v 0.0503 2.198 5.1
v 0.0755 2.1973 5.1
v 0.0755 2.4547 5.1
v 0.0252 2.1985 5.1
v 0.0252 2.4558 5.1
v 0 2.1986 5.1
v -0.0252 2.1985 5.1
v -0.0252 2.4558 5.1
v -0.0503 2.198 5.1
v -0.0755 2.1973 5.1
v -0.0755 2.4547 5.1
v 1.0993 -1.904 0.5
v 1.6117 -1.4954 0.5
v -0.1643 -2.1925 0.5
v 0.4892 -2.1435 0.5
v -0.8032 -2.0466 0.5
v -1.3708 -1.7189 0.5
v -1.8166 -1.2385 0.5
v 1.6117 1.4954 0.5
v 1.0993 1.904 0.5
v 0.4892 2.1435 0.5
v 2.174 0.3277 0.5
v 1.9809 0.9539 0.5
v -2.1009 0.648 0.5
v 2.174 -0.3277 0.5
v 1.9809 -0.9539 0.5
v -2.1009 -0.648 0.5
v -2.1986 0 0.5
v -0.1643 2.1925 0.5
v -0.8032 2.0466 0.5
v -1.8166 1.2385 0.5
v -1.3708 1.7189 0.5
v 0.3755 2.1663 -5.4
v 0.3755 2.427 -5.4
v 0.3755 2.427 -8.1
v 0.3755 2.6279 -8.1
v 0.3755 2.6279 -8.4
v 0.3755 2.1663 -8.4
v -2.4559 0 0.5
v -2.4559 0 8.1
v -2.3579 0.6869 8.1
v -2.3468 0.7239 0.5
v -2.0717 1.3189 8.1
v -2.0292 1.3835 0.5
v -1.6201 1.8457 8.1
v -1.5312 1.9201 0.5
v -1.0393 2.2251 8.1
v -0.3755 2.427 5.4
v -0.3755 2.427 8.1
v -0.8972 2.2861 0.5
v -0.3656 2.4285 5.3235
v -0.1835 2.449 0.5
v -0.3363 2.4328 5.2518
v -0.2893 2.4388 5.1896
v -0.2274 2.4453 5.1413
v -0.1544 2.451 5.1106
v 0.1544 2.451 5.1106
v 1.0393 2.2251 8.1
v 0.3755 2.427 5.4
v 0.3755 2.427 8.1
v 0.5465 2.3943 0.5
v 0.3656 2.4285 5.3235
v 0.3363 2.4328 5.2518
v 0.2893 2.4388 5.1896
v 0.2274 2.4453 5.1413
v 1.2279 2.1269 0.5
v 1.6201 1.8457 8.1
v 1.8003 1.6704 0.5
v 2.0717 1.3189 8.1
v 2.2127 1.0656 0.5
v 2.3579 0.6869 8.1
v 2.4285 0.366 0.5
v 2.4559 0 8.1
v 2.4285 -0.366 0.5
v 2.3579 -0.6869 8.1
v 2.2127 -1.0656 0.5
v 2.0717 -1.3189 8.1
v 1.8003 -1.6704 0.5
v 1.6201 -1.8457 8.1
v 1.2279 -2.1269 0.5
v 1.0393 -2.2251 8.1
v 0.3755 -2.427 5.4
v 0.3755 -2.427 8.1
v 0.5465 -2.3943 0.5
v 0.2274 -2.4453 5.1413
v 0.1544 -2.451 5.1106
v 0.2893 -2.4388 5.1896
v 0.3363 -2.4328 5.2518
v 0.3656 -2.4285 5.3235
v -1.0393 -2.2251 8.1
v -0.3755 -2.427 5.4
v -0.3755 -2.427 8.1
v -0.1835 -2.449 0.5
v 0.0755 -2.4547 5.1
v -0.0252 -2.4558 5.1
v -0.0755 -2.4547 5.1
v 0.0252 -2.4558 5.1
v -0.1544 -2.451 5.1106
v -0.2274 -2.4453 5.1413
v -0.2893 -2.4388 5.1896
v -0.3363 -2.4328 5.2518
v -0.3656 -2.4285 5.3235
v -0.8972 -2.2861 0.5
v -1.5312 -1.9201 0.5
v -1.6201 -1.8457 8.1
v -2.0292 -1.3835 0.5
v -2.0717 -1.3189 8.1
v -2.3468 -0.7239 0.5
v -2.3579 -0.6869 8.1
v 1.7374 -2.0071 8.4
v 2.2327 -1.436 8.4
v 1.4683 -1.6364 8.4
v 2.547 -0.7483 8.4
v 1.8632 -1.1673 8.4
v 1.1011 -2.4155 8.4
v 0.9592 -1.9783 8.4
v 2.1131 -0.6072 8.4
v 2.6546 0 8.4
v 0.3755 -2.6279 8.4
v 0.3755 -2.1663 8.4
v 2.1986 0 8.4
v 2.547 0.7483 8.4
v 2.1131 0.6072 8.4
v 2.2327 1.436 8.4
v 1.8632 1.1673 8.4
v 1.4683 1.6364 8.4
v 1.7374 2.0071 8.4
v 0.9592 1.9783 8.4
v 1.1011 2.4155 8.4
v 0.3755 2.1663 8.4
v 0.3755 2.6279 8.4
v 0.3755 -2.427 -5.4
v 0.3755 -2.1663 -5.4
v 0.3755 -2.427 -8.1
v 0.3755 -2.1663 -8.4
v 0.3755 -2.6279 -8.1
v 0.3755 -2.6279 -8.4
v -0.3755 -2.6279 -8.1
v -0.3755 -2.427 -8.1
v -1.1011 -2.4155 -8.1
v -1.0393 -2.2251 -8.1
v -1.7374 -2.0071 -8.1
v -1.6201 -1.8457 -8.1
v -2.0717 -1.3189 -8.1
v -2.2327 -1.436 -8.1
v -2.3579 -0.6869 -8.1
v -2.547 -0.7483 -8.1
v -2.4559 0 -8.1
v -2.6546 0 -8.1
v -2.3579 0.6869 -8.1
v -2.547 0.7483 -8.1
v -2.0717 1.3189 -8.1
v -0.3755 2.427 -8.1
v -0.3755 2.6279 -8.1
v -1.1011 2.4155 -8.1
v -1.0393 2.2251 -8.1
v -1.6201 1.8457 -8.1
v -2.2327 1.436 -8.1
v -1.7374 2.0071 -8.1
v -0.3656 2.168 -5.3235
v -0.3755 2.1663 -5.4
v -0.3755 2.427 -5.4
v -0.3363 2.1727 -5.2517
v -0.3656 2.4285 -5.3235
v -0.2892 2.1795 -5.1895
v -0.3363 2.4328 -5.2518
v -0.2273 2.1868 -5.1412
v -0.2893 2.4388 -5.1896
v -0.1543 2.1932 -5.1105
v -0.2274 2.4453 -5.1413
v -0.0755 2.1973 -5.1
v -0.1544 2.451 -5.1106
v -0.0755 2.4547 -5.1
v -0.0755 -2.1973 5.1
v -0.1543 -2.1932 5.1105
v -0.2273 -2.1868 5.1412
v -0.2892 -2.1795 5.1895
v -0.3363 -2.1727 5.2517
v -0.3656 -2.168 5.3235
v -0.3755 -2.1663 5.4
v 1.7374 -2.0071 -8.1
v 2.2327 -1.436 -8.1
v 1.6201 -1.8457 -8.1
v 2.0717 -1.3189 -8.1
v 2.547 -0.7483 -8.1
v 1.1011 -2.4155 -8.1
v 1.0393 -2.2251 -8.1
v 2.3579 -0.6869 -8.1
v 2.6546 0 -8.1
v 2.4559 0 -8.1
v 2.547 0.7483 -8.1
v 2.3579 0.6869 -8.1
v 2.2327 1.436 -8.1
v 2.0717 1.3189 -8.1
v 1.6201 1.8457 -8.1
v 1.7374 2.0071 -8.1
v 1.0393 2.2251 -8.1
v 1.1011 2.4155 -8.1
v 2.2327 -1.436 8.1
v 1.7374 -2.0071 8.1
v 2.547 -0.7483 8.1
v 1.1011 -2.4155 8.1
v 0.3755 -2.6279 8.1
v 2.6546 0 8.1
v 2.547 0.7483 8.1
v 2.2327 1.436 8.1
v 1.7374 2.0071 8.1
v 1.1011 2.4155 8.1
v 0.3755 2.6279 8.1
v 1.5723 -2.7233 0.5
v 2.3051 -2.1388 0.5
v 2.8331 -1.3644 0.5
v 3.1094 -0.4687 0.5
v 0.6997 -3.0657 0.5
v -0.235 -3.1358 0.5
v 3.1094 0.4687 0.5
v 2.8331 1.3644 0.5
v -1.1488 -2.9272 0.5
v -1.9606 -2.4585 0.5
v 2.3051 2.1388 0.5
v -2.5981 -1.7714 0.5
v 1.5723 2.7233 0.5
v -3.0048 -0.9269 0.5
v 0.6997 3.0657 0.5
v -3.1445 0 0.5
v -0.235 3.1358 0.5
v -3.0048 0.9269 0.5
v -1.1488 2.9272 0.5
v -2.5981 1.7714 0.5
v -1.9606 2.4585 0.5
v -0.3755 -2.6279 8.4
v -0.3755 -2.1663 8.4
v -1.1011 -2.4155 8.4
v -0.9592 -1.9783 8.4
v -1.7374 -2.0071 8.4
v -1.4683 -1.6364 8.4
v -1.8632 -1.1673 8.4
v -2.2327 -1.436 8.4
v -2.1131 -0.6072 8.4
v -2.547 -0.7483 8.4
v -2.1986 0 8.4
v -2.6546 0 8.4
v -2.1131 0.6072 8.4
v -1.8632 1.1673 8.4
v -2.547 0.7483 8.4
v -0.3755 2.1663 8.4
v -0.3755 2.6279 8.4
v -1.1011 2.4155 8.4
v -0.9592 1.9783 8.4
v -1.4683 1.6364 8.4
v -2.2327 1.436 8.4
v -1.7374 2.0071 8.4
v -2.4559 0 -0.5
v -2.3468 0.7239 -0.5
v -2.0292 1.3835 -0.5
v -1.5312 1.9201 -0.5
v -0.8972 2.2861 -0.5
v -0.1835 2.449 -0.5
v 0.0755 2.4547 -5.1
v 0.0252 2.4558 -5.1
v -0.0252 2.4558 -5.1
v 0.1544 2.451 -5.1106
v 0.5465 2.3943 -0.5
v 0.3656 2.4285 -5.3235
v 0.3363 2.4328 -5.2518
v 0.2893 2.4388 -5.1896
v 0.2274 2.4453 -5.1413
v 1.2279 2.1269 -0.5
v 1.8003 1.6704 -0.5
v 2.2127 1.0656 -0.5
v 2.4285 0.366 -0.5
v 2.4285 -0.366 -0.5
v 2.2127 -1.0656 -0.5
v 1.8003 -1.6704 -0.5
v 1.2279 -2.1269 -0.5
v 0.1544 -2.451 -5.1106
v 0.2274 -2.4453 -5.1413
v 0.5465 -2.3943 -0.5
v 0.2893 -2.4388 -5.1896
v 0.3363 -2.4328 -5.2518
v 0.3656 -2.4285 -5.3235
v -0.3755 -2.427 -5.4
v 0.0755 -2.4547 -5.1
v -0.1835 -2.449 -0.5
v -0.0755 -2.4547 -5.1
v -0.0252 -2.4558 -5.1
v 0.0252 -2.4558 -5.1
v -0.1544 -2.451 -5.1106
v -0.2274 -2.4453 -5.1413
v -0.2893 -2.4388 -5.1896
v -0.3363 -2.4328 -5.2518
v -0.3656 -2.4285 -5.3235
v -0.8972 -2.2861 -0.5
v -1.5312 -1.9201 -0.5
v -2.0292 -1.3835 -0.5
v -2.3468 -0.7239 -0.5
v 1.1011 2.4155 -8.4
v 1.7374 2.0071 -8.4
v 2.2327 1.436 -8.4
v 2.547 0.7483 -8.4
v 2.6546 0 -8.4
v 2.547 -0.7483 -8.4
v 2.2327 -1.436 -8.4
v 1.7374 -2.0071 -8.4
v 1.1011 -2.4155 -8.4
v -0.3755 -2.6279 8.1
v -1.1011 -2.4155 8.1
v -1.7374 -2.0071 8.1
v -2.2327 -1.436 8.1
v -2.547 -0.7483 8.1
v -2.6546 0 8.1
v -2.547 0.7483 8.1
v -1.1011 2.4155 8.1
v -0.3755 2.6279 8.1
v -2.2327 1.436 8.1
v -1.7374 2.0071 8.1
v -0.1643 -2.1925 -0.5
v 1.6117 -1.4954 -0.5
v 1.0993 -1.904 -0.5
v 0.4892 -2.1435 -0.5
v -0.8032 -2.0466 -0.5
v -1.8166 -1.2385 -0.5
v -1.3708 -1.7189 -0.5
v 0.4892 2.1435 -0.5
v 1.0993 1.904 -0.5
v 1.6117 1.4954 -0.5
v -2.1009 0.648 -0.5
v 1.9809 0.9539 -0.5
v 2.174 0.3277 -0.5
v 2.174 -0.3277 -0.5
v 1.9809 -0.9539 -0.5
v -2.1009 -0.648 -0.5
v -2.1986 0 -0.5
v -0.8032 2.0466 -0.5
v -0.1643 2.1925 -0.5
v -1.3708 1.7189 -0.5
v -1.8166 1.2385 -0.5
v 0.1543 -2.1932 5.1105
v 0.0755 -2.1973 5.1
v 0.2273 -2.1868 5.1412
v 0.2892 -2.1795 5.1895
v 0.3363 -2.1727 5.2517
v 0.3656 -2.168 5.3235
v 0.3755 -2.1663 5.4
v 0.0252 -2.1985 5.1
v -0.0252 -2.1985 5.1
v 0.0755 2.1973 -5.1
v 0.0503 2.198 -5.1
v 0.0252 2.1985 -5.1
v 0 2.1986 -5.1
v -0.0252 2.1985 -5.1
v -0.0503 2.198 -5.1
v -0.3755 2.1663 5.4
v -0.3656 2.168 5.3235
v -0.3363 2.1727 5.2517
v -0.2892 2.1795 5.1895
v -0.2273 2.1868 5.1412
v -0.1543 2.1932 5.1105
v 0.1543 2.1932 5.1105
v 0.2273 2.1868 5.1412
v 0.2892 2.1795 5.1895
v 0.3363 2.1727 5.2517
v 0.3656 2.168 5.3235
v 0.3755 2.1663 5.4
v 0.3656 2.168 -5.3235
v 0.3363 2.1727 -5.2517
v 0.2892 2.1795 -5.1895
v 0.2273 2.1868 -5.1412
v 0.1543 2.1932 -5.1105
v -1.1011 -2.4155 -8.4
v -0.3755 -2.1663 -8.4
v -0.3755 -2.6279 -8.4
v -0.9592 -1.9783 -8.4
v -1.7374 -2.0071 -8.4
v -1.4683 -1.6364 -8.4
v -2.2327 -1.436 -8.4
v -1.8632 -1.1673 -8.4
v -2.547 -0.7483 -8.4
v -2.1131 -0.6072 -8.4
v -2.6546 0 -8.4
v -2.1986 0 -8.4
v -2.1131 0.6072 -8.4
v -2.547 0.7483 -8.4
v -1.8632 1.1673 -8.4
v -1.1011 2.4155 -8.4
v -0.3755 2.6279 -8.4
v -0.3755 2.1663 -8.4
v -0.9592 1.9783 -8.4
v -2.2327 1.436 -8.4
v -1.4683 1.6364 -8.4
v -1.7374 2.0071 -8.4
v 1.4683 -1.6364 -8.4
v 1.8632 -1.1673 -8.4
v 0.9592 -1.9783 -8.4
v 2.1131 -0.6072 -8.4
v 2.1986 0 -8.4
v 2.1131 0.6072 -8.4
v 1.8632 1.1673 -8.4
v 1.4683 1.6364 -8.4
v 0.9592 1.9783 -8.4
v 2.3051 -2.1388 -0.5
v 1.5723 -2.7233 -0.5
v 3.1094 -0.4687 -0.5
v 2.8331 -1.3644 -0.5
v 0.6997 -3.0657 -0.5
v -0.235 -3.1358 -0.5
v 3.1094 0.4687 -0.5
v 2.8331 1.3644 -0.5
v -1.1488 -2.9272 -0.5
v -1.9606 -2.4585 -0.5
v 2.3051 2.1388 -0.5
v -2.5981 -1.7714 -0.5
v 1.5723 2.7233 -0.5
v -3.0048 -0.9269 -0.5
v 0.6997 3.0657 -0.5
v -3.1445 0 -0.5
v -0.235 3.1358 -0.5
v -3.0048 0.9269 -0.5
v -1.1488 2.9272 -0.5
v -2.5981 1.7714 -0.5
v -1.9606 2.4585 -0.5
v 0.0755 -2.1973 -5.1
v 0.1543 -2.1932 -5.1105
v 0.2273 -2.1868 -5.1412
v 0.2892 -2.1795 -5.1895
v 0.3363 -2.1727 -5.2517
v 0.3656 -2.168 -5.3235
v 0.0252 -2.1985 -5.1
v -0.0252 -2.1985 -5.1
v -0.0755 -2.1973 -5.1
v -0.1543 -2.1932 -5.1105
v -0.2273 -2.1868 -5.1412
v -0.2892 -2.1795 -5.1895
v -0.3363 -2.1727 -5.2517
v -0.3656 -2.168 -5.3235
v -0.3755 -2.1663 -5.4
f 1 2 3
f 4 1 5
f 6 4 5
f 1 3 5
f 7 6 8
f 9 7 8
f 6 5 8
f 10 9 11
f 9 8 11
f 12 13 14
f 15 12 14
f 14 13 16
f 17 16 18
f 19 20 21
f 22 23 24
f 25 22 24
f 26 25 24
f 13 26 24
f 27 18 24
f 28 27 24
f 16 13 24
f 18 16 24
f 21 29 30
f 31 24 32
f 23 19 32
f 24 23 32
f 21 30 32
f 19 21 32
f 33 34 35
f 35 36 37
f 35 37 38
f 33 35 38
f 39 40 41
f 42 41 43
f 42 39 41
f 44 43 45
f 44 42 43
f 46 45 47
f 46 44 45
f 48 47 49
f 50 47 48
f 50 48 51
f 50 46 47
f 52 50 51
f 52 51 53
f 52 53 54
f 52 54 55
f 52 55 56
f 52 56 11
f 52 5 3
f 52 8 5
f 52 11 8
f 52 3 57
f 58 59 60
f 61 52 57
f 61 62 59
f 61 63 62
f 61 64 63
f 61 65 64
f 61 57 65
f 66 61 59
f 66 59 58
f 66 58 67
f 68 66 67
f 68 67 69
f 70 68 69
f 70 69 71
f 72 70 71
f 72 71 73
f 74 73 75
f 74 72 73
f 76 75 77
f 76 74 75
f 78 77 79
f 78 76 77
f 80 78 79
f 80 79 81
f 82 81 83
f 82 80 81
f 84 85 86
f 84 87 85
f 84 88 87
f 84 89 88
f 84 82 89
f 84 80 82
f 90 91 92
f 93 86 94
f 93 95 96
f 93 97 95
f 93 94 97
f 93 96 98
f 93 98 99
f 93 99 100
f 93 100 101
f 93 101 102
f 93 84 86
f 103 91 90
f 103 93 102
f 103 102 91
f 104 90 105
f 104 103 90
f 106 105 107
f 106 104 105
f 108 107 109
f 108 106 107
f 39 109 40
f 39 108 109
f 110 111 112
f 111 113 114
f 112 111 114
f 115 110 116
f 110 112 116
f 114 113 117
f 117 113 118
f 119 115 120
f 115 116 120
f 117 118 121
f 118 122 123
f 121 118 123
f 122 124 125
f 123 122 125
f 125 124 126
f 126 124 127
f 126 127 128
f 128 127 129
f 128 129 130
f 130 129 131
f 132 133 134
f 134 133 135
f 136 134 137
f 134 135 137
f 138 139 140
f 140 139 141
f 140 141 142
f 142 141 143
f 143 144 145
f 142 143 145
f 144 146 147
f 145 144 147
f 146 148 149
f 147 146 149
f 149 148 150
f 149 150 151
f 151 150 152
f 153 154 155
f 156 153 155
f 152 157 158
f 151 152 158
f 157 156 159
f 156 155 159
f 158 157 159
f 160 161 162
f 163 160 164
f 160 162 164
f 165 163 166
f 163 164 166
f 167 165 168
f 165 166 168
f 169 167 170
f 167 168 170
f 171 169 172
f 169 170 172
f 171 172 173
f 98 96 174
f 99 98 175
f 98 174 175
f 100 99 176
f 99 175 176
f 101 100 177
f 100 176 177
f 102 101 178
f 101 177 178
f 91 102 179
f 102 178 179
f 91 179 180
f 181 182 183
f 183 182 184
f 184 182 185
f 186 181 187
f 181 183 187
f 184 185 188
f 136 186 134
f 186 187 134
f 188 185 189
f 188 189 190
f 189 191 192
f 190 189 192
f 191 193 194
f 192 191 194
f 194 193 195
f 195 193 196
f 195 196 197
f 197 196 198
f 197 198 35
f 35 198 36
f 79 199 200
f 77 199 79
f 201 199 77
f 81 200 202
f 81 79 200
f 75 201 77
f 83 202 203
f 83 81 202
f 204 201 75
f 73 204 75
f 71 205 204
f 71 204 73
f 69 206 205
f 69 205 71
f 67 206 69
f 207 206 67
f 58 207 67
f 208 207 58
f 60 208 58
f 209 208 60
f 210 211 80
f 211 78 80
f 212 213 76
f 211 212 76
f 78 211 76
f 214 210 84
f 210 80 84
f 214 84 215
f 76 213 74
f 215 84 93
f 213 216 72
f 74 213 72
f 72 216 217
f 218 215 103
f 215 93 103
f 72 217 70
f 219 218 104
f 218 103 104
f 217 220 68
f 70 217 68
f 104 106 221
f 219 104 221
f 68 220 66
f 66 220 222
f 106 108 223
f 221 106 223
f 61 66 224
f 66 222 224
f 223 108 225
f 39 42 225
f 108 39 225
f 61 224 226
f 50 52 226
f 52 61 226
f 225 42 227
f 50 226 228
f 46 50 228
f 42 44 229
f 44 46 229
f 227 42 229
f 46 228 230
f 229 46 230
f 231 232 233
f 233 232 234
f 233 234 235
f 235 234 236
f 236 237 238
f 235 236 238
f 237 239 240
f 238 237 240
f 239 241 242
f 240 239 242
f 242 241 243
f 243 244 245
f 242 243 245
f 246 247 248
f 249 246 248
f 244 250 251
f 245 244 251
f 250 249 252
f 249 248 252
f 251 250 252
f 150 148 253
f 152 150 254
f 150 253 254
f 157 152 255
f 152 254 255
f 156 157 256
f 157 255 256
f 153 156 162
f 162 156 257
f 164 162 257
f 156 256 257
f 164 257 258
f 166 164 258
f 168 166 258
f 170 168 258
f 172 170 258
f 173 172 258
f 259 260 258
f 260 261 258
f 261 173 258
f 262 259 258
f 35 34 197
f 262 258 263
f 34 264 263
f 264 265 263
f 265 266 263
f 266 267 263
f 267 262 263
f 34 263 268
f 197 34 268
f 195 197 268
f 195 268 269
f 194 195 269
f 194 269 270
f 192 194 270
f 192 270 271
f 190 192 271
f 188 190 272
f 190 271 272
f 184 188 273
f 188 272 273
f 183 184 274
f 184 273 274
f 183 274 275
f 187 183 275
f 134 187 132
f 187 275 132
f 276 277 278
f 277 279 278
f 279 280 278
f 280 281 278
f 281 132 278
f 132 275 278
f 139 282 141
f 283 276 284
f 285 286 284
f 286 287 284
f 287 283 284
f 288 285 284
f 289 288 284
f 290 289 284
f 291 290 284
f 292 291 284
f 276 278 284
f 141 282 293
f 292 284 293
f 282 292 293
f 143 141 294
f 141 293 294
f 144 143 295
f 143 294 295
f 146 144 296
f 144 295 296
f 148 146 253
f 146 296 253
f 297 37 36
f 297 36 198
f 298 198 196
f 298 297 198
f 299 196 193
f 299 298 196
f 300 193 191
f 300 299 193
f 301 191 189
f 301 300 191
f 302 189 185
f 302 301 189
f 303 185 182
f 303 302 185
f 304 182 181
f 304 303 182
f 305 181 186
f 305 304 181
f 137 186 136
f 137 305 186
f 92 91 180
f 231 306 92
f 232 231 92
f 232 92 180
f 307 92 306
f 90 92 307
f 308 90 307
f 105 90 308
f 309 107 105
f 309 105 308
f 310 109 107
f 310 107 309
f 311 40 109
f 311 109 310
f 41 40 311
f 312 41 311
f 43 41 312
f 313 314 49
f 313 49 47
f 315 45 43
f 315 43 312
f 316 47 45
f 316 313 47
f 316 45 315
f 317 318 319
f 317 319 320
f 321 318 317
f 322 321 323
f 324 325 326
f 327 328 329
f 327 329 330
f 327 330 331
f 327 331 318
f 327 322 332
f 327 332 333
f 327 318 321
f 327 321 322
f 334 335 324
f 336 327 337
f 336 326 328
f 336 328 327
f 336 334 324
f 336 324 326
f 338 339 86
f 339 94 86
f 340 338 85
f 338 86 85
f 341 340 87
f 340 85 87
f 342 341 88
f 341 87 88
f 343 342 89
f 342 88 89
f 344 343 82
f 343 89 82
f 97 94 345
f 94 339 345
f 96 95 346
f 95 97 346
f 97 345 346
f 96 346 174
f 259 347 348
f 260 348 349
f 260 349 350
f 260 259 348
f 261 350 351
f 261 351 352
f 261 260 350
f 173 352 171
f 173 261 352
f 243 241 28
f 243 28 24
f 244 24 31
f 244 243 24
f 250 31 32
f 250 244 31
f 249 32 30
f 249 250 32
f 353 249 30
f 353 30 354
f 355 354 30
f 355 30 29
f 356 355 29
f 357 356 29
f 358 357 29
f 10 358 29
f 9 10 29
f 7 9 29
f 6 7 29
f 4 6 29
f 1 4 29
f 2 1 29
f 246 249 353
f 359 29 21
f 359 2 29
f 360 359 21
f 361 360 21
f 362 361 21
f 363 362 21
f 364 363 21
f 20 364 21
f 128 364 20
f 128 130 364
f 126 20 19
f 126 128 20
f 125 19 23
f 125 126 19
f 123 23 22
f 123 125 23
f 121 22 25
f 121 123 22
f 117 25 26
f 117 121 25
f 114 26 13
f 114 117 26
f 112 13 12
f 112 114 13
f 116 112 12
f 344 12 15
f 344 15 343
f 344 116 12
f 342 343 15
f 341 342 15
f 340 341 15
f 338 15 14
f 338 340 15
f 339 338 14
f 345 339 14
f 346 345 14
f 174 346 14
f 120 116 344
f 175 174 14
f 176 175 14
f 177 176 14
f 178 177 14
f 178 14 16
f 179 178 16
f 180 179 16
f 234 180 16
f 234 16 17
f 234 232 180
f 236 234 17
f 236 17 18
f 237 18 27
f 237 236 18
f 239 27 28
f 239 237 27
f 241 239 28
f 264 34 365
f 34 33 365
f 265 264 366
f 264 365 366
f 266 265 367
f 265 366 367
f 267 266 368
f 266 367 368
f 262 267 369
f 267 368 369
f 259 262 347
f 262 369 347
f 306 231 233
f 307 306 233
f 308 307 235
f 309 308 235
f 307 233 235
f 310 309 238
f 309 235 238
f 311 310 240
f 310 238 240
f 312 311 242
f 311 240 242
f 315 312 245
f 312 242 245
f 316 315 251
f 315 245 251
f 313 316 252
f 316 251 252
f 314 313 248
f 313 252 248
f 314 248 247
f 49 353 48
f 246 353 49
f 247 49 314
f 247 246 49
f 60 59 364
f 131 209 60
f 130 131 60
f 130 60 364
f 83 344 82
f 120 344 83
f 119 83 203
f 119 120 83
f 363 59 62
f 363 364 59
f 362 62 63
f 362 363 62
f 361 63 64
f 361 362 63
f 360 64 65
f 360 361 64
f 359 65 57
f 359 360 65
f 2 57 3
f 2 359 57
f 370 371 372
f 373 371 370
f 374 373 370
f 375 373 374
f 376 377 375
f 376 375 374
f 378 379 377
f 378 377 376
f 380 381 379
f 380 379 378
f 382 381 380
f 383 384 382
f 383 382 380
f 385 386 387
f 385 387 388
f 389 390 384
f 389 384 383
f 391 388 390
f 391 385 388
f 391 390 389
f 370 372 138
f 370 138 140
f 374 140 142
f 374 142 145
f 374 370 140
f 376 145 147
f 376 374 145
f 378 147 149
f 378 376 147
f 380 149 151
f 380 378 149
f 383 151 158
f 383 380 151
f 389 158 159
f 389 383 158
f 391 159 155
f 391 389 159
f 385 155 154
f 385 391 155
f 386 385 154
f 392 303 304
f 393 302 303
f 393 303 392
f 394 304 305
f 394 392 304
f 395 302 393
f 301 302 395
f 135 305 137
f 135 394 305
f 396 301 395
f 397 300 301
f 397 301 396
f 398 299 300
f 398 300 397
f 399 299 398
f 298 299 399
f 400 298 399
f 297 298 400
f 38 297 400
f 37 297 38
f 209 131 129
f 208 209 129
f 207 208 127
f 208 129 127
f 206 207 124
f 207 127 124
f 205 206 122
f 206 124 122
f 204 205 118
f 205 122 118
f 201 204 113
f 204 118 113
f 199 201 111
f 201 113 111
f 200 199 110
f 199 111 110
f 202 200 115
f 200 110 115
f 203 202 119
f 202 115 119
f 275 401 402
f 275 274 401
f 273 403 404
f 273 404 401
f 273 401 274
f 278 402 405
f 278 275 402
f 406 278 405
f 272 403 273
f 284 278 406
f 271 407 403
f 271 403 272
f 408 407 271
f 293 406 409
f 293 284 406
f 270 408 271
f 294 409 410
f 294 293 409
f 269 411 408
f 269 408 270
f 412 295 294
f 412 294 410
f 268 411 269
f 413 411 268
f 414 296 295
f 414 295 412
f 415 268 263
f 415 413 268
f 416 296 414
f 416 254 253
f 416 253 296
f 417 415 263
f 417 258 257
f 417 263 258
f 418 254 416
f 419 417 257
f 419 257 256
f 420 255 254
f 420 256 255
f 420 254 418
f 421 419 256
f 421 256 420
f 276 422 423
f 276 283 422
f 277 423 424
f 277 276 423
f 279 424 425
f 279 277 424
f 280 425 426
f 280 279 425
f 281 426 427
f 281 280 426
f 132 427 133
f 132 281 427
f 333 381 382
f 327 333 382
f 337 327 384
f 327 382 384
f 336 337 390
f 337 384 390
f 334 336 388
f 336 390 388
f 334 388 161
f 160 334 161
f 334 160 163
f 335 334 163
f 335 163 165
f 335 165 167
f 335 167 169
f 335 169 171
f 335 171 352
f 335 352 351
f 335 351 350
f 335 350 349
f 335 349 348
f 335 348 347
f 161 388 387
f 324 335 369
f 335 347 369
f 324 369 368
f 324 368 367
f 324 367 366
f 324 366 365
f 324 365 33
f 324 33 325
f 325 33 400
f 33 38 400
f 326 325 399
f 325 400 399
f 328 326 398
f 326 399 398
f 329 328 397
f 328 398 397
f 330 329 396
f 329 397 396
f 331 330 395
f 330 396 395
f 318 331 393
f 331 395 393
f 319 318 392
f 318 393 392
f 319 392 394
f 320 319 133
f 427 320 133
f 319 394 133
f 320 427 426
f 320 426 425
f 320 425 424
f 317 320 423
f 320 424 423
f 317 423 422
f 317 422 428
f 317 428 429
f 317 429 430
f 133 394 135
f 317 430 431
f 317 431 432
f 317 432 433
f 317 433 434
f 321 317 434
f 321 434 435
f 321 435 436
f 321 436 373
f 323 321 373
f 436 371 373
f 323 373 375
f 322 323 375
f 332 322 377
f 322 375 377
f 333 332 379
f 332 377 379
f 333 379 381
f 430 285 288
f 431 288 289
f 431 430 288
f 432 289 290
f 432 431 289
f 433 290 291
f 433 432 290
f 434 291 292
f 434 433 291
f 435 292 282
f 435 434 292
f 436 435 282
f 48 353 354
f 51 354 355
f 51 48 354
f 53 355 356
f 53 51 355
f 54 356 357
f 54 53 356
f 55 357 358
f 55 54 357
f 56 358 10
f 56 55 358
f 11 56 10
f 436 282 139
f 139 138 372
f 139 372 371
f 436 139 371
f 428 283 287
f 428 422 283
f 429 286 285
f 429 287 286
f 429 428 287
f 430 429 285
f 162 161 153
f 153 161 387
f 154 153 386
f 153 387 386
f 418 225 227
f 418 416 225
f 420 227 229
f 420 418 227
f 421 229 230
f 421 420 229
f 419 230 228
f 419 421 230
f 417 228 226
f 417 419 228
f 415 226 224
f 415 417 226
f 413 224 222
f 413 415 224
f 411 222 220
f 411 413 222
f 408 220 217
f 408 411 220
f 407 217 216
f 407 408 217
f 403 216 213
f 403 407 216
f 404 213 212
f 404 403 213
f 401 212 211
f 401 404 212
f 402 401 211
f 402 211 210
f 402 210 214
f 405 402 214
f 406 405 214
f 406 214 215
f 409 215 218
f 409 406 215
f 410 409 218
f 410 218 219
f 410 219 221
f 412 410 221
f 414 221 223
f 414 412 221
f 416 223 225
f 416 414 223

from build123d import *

# Parameters (mm, degrees)
BOSS_EXTRUDE1_DEPTH = 7.9
SKETCH2_R           = 3.144549921
BOSS_EXTRUDE3_DEPTH = 0.5
SKETCH3_R           = 2.455888386
BOSS_EXTRUDE4_DEPTH = 7.9
SKETCH4_R           = 2.65462565
BOSS_EXTRUDE5_DEPTH = 0.3
SKETCH5_R           = 2.198604039
CUT_EXTRUDE1_DEPTH  = 7.9
CUT_EXTRUDE2_DEPTH  = 3.3
FILLET1_R           = 0.3
CUT_EXTRUDE5_START  = 9
SKETCH7_R           = 3.144549921
CUT_EXTRUDE5_DEPTH  = 9


with BuildPart() as part:
    # Sketch1 → Boss-Extrude1 (new body)
    with BuildSketch(Plane.XY):
        Polygon((-2.4, 0.895), (-2.4, 0), (0, 0), (0, 2.4), (-0.9, 2.4), (-0.9, 0.895), align=None)
        Polygon((0, 0), (-2.4, 0), (-2.4, -0.895), (-0.9, -0.895), (-0.9, -2.4), (0, -2.4), align=None)
        Polygon((0, 2.4), (0, 0), (2.4, 0), (2.4, 0.895), (0.9, 0.895), (0.9, 2.4), align=None)
        Polygon((2.4, 0), (0, 0), (0, -2.4), (0.9, -2.4), (0.9, -0.895), (2.4, -0.895), align=None)
    extrude(amount=BOSS_EXTRUDE1_DEPTH)

    # Sketch2 → Boss-Extrude3 (add)
    with BuildSketch(Plane(origin=(0, 0, 0), x_dir=(-1, 0, 0), z_dir=(0, 0, -1))):
        Circle(SKETCH2_R)
    extrude(amount=BOSS_EXTRUDE3_DEPTH)

    # Sketch3 → Boss-Extrude4 (add)
    with BuildSketch(Plane(origin=(0, 0, -0.5), x_dir=(-1, 0, 0), z_dir=(0, 0, -1))):
        Circle(SKETCH3_R)
    extrude(amount=BOSS_EXTRUDE4_DEPTH)

    # Sketch4 → Boss-Extrude5 (add)
    with BuildSketch(Plane(origin=(0, 0, -8.4), x_dir=(-1, 0, 0), z_dir=(0, 0, -1))):
        Circle(SKETCH4_R)
    extrude(amount=-BOSS_EXTRUDE5_DEPTH)

    # Sketch5 → Cut-Extrude1 (cut)
    with BuildSketch(Plane(origin=(0, 0, -8.4), x_dir=(-1, 0, 0), z_dir=(0, 0, -1))):
        Circle(SKETCH5_R)
    extrude(amount=-CUT_EXTRUDE1_DEPTH, mode=Mode.SUBTRACT)

    # Sketch6 → Cut-Extrude2 (cut)
    with BuildSketch(Plane(origin=(0, 0, -8.4), x_dir=(-1, 0, 0), z_dir=(0, 0, -1))):
        with BuildLine():
            Line((0.375484044, 2.166303638), (0.375484044, 2.627936276))
            ThreePointArc((0.375484044, 2.627936276), (0.188215694, 2.6479449), (0, 2.65462565))
            Line((0, 2.65462565), (0, 2.198604039))
            ThreePointArc((0, 2.198604039), (0.188435389, 2.190514055), (0.375484044, 2.166303638))
        make_face()
        with BuildLine():
            Line((0, 2.198604039), (0, 2.65462565))
            ThreePointArc((0, 2.65462565), (-0.188215694, 2.6479449), (-0.375484044, 2.627936276))
            Line((-0.375484044, 2.627936276), (-0.375484044, 2.166303638))
            ThreePointArc((-0.375484044, 2.166303638), (-0.188435389, 2.190514055), (0, 2.198604039))
        make_face()
        with BuildLine():
            ThreePointArc((0, -2.65462565), (0.188215694, -2.6479449), (0.375484044, -2.627936276))
            Line((0.375484044, -2.627936276), (0.375484044, -2.166303638))
            ThreePointArc((0.375484044, -2.166303638), (0, -2.198604039), (-0.375484044, -2.166303638))
            Line((-0.375484044, -2.166303638), (-0.375484044, -2.627936276))
            ThreePointArc((-0.375484044, -2.627936276), (-0.188215694, -2.6479449), (0, -2.65462565))
        make_face()
    extrude(amount=-CUT_EXTRUDE2_DEPTH, mode=Mode.SUBTRACT)

    # Fillet1
    fillet1_edges = [part.edges().sort_by_distance(p)[0] for p in [
        (0.375484044, 2.296659081, -5.1),
        (-0.375484044, 2.296659081, -5.1),
        (-0.375484044, -2.296659081, -5.1),
        (0.375484044, -2.296659081, -5.1),
    ]]
    fillet(fillet1_edges, radius=FILLET1_R)

    # Sketch7 → Cut-Extrude5 (cut)
    with BuildSketch(Plane.XY.offset(CUT_EXTRUDE5_START)):
        with Locations(Location((0, 0, 0), (0, 0, 180))):
            Circle(SKETCH7_R)
    extrude(amount=-CUT_EXTRUDE5_DEPTH, mode=Mode.SUBTRACT)

    # Mirror3: part across face


with BuildPart() as part_1:
    add(part.part)
    add(part.part.mirror(Plane.XY))


solid = part_1.part
